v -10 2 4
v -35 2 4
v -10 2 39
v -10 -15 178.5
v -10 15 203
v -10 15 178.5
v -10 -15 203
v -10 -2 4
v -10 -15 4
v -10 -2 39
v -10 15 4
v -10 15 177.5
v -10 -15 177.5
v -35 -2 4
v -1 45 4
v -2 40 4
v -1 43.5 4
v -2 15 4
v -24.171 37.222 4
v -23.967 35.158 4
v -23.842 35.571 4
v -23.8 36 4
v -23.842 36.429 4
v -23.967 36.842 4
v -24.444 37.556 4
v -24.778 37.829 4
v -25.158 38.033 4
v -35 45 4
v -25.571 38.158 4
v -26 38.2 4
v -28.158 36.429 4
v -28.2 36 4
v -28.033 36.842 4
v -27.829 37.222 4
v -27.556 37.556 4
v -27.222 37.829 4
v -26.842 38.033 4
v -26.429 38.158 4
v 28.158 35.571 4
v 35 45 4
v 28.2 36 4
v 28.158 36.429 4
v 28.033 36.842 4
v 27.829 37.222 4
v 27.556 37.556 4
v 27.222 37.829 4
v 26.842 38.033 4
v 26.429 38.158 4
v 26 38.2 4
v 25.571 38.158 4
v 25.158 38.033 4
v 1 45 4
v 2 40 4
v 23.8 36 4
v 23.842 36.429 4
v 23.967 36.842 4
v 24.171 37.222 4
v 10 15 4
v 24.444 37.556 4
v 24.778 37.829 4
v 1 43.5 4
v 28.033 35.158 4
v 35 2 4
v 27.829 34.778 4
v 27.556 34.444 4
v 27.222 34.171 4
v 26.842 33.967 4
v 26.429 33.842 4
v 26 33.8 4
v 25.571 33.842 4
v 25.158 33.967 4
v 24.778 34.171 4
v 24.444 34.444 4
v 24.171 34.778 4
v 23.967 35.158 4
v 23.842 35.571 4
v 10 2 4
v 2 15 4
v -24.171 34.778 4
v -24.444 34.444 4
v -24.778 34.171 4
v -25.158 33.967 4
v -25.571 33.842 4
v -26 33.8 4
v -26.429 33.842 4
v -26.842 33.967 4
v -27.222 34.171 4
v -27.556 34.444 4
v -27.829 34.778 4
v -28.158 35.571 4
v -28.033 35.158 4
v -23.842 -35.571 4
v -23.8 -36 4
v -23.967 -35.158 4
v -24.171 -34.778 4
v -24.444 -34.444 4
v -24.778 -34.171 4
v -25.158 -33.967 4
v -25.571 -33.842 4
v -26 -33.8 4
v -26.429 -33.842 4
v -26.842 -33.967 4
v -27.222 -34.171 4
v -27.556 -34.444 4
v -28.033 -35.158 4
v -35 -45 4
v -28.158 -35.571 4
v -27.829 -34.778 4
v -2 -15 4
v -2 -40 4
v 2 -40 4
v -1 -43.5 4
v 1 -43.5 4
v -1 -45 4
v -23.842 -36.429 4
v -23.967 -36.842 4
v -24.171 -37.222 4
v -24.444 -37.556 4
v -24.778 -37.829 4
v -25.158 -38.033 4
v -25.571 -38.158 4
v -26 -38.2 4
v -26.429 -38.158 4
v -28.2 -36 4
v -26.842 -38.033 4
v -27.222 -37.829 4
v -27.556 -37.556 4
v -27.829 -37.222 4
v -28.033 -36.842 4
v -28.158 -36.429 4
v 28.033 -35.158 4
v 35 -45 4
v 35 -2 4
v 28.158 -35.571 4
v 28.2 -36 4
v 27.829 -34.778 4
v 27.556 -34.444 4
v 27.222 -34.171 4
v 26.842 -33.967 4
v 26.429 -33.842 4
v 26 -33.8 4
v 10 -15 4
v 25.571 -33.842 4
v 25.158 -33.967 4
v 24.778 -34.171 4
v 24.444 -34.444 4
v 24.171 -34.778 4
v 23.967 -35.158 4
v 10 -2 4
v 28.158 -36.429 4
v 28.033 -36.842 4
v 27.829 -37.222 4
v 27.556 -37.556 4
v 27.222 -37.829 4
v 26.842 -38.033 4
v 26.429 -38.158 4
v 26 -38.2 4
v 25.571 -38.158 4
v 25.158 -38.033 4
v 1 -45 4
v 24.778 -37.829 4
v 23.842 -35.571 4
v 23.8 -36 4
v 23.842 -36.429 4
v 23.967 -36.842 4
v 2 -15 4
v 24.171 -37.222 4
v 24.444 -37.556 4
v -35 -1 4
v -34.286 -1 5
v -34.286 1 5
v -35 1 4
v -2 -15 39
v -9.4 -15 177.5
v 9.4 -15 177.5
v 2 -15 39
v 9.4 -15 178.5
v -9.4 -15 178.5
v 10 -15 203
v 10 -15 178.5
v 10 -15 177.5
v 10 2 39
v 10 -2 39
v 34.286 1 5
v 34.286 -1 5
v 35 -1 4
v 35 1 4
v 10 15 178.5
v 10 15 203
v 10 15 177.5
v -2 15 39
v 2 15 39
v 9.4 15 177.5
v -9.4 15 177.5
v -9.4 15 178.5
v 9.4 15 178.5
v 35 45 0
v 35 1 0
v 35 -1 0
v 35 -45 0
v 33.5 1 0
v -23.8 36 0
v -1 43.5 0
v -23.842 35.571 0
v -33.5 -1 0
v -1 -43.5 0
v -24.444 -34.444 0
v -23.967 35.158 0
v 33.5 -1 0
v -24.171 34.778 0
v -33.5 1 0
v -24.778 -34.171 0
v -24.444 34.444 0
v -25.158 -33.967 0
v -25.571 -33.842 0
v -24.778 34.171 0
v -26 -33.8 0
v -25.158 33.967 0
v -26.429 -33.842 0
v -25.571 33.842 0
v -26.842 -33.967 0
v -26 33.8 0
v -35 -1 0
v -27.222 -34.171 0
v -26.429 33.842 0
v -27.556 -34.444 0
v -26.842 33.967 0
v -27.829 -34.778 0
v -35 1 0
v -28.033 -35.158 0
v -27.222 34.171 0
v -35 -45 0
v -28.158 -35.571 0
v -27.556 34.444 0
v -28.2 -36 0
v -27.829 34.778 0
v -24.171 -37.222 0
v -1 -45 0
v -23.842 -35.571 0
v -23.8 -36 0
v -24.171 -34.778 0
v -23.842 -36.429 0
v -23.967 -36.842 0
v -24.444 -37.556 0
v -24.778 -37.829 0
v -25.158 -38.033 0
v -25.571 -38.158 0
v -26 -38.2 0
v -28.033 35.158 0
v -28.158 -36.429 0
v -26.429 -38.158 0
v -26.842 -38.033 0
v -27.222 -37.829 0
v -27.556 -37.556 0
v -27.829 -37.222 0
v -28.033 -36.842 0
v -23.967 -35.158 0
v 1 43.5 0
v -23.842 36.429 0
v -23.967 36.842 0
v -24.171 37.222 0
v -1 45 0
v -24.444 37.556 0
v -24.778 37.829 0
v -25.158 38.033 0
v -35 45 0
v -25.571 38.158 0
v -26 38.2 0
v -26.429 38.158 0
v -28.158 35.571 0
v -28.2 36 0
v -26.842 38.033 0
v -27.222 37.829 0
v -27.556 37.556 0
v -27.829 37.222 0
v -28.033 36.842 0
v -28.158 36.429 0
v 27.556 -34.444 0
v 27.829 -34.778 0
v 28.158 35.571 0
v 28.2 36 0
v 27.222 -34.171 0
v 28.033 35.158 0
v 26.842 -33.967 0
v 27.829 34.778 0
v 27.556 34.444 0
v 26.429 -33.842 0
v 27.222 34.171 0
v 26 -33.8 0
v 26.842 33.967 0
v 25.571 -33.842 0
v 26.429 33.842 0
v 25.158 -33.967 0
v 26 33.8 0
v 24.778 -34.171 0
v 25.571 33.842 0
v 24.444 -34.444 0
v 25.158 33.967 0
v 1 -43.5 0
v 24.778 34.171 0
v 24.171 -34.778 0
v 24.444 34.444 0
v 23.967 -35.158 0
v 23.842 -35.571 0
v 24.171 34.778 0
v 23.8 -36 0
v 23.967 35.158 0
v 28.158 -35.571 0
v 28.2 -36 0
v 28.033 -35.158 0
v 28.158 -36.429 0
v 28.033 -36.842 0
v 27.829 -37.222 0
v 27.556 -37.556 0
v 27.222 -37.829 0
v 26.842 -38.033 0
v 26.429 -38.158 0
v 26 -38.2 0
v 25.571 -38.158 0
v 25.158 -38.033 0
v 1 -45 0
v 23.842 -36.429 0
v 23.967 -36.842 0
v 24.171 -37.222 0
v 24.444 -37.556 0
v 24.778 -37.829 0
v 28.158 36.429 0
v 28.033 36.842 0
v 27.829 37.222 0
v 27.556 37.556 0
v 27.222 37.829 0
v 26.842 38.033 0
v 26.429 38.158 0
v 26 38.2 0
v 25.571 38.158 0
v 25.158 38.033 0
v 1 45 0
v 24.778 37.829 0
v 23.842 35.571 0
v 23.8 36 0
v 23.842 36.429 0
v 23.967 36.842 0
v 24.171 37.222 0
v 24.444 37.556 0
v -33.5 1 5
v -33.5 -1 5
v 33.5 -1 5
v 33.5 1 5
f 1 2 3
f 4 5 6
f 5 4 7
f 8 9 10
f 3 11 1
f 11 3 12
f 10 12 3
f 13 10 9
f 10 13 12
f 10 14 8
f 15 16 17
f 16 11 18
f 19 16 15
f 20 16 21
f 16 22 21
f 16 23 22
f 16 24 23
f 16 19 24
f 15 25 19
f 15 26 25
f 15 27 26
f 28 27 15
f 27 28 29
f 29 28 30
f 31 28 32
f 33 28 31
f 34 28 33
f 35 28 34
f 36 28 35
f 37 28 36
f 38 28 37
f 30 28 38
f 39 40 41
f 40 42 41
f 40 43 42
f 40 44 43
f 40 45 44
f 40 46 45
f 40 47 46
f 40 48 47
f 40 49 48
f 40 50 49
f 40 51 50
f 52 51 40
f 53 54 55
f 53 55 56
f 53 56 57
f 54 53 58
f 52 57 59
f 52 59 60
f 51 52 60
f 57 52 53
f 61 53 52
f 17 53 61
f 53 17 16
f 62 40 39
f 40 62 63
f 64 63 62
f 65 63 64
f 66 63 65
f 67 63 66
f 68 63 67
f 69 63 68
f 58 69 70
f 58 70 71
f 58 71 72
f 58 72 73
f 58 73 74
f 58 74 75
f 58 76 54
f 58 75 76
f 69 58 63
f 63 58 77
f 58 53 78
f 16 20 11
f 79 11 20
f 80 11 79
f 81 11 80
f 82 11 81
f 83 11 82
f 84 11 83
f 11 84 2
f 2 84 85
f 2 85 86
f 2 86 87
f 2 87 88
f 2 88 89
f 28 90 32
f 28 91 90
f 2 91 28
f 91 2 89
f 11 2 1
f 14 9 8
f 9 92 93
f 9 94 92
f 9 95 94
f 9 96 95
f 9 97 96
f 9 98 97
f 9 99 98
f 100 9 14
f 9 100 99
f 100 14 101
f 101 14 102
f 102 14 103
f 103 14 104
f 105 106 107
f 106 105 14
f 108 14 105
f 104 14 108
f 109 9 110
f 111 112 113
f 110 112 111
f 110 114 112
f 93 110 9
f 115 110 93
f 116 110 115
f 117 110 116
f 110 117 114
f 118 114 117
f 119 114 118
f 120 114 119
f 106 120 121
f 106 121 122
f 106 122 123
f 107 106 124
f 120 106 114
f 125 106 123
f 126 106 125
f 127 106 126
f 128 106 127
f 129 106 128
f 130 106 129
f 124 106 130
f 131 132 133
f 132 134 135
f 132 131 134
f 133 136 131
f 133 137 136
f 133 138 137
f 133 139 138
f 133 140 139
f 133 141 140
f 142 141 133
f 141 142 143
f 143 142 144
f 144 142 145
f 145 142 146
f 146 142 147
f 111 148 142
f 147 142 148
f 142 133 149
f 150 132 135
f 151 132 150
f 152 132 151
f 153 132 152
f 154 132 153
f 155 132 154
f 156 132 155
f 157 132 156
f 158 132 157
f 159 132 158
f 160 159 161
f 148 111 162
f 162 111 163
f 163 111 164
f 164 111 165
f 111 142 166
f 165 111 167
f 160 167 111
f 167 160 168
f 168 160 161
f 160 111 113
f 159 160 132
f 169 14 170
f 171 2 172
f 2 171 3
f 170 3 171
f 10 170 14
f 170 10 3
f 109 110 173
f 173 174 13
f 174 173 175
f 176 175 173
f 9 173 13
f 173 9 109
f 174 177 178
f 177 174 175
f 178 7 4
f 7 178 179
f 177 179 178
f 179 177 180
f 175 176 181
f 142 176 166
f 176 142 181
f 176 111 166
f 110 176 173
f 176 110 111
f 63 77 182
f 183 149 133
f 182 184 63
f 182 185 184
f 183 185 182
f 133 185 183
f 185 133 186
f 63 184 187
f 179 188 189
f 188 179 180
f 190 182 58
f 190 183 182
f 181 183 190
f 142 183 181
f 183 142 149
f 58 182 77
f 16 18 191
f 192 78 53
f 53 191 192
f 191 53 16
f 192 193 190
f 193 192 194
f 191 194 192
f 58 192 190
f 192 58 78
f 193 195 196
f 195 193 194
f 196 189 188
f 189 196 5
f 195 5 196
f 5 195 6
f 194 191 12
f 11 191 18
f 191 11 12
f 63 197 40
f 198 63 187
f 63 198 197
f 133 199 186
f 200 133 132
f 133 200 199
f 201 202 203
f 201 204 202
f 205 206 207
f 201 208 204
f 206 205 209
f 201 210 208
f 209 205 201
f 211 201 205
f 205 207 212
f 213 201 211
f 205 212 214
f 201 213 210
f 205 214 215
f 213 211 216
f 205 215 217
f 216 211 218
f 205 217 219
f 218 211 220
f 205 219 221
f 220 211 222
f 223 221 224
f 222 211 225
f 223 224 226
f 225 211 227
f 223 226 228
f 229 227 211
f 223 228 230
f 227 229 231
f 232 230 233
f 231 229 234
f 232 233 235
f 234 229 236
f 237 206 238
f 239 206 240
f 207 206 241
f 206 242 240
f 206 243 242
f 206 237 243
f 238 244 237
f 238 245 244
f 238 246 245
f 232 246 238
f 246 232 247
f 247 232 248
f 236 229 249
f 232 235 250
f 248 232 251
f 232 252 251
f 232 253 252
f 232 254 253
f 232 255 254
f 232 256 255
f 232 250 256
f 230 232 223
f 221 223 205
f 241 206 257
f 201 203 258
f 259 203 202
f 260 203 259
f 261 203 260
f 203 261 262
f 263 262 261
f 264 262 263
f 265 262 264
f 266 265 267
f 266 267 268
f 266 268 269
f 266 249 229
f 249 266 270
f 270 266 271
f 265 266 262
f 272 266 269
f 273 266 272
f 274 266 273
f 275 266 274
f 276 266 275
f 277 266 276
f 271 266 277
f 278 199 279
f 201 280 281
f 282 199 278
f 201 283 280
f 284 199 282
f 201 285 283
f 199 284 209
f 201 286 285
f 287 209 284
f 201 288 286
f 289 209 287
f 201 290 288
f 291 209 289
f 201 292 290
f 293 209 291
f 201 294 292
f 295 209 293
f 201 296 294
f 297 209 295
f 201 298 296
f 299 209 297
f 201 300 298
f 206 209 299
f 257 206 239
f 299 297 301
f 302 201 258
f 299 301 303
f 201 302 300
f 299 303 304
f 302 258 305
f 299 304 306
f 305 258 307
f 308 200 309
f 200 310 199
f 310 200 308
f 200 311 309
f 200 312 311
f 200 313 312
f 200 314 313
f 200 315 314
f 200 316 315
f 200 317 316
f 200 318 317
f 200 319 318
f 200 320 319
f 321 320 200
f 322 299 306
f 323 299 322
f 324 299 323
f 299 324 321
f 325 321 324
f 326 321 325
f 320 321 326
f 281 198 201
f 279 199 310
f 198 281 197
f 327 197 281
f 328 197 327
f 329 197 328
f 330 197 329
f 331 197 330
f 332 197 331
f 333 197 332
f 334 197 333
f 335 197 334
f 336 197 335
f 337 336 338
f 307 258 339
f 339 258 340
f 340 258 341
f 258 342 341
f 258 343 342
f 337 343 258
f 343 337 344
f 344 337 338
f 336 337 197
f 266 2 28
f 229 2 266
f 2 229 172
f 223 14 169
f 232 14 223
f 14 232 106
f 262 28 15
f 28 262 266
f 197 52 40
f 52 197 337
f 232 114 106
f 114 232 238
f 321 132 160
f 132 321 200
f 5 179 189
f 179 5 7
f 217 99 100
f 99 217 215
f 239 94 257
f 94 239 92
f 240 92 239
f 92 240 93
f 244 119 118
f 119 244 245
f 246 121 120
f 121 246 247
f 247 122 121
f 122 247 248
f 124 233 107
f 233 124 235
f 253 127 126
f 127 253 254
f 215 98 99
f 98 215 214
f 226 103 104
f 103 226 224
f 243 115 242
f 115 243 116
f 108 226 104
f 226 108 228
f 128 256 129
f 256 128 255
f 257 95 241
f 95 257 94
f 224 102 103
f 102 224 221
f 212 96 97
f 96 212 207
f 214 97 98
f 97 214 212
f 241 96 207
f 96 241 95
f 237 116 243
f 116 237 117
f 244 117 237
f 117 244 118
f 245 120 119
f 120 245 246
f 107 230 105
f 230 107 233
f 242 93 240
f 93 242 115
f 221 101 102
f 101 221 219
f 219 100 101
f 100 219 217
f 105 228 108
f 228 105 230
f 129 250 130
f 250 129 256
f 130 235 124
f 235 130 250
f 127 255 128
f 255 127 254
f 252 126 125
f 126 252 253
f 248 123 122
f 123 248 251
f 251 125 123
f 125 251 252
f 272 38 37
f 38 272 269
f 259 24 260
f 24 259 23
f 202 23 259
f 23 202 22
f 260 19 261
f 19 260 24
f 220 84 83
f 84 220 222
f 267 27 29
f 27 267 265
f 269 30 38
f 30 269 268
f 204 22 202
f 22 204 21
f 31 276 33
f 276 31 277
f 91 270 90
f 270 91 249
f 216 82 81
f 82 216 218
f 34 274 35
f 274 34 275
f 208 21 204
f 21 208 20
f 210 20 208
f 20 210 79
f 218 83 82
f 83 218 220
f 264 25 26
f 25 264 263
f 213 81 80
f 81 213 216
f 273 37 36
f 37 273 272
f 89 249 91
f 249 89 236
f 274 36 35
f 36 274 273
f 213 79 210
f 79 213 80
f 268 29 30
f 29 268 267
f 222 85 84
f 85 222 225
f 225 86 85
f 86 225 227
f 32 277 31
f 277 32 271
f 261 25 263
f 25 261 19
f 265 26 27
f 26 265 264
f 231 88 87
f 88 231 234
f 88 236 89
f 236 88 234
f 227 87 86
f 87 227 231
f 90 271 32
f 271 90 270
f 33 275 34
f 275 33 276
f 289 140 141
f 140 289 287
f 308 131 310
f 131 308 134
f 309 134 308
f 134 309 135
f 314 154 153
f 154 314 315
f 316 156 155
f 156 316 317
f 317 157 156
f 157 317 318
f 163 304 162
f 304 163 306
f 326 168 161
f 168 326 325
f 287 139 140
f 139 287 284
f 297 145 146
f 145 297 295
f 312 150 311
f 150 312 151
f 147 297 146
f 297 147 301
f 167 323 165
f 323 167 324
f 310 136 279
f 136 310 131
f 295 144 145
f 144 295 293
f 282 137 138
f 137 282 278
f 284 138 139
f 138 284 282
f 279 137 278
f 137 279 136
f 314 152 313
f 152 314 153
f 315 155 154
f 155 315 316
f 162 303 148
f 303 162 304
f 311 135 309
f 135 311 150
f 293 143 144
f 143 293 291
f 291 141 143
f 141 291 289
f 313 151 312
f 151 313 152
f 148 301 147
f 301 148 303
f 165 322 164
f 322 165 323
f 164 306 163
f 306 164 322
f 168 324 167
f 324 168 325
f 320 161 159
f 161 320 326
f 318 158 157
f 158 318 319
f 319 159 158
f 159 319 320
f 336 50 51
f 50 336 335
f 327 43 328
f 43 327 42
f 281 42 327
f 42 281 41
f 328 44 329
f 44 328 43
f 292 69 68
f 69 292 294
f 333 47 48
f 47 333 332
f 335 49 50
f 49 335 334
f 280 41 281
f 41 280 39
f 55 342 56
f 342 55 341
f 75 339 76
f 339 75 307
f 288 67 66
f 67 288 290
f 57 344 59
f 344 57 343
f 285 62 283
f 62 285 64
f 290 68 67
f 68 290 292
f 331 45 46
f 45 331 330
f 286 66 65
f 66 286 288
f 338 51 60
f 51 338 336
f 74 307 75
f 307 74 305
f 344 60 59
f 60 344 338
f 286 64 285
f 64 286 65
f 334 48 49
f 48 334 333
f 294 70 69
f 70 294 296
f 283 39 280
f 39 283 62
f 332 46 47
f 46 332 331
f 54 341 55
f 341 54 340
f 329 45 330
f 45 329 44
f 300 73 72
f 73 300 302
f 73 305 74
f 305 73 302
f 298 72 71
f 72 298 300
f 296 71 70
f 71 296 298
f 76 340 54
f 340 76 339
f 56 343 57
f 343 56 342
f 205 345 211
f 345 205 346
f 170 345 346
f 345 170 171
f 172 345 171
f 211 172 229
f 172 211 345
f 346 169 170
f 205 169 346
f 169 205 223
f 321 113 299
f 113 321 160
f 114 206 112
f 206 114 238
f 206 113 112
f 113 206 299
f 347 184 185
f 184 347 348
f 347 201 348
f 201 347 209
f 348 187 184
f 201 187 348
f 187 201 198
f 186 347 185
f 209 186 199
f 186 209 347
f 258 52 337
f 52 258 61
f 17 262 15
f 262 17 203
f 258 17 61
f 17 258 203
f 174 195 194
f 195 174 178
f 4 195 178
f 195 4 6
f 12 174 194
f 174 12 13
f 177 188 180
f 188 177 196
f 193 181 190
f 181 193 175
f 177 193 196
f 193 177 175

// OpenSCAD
// Push-and-pull handle: a vertical post glued or screwed to the TOP CENTRE of
// the 240 x 160 x 95 mm box (2026-10-06). Matches the Isaac scene that flew 6/6
// (07 push-and-pull, PEGASUS_PUSH_HANDLE=post, PEGASUS_PUSH_POST_TOP=0.298):
// the gripper grasps the post 25 mm below its top, 0.273 m above the table.
//
// Orientation on the box: the post's THICKNESS (post_t, 20 mm) runs ACROSS the
// table (the box's 160 mm width) -- the direction the jaws close; its DEPTH
// (post_d, 30 mm) runs ALONG the push (the box's 240 mm length). The two
// gripped faces are therefore the 30 mm-wide faces.
//
// Units: mm. Print upright (base plate on the bed), 4 perimeters, 20-30 %
// infill; the base fillet ribs keep the root stiff. Bending at the root from a
// ~1.2 N push 0.18 m up is ~0.2 N.m (stress ~0.1 MPa), far below PLA's layer
// strength. Weigh the printed handle: box + handle is the mass the sim needs.

box_h      = 95;    // box height (only used for the reported heights)
post_top   = 298;   // post top above the TABLE (sim: 0.298 m)
grasp_down = 25;    // grasp point below the post top (sim)
post_t     = 20;    // thickness ACROSS the jaws (check: inside your gripper's closing range)
post_d     = 30;    // depth ALONG the push
plate_x    = 70;    // base plate across the box (box is 160)
plate_y    = 90;    // base plate along the box (box is 240)
plate_h    = 4;     // base plate thickness
rib_h      = 35;    // fillet rib height
rib_l      = 25;    // fillet rib reach from the post
rib_t      = 4;     // fillet rib thickness
hole_d     = 4.4;   // M4 clearance (or leave the holes empty and glue / tape)
hole_inset = 9;     // hole centre from the plate edge

post_h = post_top - box_h;          // above the box top, plate included (203 mm)
echo(str("part height ", post_h, " mm; grasp at ", post_h - grasp_down,
         " mm above the box top = ", post_top - grasp_down, " mm above the table"));

module rib(len, ht, th) {           // right-angle triangle in the x-z plane, extruded th along y
  rotate([90, 0, 0]) linear_extrude(height = th, center = true)
    polygon([[0, 0], [len, 0], [0, ht]]);
}

difference() {
  union() {
    // base plate, centred on the origin = the box's top centre
    translate([-plate_x / 2, -plate_y / 2, 0]) cube([plate_x, plate_y, plate_h]);
    // the post
    translate([-post_t / 2, -post_d / 2, 0]) cube([post_t, post_d, post_h]);
    // four fillet ribs at the root (two across, two along)
    for (s = [-1, 1]) {
      translate([s * post_t / 2, 0, plate_h]) scale([s, 1, 1]) rib(rib_l, rib_h, rib_t);
      translate([0, s * post_d / 2, plate_h]) rotate([0, 0, 90]) scale([s, 1, 1]) rib(rib_l, rib_h, rib_t);
    }
  }
  // mounting holes
  for (sx = [-1, 1], sy = [-1, 1])
    translate([sx * (plate_x / 2 - hole_inset), sy * (plate_y / 2 - hole_inset), -1])
      cylinder(d = hole_d, h = plate_h + 2, $fn = 32);
  // centring notches on the plate edges: line them up with the box's centre lines
  for (s = [-1, 1]) {
    translate([s * plate_x / 2, 0, plate_h / 2]) cube([3, 2, plate_h + 2], center = true);
    translate([0, s * plate_y / 2, plate_h / 2]) cube([2, 3, plate_h + 2], center = true);
  }
  // shallow groove marking the grasp height on the two gripped (30 mm) faces
  for (s = [-1, 1])
    translate([s * post_t / 2, 0, post_h - grasp_down]) cube([1.2, post_d + 2, 1.0], center = true);
}
